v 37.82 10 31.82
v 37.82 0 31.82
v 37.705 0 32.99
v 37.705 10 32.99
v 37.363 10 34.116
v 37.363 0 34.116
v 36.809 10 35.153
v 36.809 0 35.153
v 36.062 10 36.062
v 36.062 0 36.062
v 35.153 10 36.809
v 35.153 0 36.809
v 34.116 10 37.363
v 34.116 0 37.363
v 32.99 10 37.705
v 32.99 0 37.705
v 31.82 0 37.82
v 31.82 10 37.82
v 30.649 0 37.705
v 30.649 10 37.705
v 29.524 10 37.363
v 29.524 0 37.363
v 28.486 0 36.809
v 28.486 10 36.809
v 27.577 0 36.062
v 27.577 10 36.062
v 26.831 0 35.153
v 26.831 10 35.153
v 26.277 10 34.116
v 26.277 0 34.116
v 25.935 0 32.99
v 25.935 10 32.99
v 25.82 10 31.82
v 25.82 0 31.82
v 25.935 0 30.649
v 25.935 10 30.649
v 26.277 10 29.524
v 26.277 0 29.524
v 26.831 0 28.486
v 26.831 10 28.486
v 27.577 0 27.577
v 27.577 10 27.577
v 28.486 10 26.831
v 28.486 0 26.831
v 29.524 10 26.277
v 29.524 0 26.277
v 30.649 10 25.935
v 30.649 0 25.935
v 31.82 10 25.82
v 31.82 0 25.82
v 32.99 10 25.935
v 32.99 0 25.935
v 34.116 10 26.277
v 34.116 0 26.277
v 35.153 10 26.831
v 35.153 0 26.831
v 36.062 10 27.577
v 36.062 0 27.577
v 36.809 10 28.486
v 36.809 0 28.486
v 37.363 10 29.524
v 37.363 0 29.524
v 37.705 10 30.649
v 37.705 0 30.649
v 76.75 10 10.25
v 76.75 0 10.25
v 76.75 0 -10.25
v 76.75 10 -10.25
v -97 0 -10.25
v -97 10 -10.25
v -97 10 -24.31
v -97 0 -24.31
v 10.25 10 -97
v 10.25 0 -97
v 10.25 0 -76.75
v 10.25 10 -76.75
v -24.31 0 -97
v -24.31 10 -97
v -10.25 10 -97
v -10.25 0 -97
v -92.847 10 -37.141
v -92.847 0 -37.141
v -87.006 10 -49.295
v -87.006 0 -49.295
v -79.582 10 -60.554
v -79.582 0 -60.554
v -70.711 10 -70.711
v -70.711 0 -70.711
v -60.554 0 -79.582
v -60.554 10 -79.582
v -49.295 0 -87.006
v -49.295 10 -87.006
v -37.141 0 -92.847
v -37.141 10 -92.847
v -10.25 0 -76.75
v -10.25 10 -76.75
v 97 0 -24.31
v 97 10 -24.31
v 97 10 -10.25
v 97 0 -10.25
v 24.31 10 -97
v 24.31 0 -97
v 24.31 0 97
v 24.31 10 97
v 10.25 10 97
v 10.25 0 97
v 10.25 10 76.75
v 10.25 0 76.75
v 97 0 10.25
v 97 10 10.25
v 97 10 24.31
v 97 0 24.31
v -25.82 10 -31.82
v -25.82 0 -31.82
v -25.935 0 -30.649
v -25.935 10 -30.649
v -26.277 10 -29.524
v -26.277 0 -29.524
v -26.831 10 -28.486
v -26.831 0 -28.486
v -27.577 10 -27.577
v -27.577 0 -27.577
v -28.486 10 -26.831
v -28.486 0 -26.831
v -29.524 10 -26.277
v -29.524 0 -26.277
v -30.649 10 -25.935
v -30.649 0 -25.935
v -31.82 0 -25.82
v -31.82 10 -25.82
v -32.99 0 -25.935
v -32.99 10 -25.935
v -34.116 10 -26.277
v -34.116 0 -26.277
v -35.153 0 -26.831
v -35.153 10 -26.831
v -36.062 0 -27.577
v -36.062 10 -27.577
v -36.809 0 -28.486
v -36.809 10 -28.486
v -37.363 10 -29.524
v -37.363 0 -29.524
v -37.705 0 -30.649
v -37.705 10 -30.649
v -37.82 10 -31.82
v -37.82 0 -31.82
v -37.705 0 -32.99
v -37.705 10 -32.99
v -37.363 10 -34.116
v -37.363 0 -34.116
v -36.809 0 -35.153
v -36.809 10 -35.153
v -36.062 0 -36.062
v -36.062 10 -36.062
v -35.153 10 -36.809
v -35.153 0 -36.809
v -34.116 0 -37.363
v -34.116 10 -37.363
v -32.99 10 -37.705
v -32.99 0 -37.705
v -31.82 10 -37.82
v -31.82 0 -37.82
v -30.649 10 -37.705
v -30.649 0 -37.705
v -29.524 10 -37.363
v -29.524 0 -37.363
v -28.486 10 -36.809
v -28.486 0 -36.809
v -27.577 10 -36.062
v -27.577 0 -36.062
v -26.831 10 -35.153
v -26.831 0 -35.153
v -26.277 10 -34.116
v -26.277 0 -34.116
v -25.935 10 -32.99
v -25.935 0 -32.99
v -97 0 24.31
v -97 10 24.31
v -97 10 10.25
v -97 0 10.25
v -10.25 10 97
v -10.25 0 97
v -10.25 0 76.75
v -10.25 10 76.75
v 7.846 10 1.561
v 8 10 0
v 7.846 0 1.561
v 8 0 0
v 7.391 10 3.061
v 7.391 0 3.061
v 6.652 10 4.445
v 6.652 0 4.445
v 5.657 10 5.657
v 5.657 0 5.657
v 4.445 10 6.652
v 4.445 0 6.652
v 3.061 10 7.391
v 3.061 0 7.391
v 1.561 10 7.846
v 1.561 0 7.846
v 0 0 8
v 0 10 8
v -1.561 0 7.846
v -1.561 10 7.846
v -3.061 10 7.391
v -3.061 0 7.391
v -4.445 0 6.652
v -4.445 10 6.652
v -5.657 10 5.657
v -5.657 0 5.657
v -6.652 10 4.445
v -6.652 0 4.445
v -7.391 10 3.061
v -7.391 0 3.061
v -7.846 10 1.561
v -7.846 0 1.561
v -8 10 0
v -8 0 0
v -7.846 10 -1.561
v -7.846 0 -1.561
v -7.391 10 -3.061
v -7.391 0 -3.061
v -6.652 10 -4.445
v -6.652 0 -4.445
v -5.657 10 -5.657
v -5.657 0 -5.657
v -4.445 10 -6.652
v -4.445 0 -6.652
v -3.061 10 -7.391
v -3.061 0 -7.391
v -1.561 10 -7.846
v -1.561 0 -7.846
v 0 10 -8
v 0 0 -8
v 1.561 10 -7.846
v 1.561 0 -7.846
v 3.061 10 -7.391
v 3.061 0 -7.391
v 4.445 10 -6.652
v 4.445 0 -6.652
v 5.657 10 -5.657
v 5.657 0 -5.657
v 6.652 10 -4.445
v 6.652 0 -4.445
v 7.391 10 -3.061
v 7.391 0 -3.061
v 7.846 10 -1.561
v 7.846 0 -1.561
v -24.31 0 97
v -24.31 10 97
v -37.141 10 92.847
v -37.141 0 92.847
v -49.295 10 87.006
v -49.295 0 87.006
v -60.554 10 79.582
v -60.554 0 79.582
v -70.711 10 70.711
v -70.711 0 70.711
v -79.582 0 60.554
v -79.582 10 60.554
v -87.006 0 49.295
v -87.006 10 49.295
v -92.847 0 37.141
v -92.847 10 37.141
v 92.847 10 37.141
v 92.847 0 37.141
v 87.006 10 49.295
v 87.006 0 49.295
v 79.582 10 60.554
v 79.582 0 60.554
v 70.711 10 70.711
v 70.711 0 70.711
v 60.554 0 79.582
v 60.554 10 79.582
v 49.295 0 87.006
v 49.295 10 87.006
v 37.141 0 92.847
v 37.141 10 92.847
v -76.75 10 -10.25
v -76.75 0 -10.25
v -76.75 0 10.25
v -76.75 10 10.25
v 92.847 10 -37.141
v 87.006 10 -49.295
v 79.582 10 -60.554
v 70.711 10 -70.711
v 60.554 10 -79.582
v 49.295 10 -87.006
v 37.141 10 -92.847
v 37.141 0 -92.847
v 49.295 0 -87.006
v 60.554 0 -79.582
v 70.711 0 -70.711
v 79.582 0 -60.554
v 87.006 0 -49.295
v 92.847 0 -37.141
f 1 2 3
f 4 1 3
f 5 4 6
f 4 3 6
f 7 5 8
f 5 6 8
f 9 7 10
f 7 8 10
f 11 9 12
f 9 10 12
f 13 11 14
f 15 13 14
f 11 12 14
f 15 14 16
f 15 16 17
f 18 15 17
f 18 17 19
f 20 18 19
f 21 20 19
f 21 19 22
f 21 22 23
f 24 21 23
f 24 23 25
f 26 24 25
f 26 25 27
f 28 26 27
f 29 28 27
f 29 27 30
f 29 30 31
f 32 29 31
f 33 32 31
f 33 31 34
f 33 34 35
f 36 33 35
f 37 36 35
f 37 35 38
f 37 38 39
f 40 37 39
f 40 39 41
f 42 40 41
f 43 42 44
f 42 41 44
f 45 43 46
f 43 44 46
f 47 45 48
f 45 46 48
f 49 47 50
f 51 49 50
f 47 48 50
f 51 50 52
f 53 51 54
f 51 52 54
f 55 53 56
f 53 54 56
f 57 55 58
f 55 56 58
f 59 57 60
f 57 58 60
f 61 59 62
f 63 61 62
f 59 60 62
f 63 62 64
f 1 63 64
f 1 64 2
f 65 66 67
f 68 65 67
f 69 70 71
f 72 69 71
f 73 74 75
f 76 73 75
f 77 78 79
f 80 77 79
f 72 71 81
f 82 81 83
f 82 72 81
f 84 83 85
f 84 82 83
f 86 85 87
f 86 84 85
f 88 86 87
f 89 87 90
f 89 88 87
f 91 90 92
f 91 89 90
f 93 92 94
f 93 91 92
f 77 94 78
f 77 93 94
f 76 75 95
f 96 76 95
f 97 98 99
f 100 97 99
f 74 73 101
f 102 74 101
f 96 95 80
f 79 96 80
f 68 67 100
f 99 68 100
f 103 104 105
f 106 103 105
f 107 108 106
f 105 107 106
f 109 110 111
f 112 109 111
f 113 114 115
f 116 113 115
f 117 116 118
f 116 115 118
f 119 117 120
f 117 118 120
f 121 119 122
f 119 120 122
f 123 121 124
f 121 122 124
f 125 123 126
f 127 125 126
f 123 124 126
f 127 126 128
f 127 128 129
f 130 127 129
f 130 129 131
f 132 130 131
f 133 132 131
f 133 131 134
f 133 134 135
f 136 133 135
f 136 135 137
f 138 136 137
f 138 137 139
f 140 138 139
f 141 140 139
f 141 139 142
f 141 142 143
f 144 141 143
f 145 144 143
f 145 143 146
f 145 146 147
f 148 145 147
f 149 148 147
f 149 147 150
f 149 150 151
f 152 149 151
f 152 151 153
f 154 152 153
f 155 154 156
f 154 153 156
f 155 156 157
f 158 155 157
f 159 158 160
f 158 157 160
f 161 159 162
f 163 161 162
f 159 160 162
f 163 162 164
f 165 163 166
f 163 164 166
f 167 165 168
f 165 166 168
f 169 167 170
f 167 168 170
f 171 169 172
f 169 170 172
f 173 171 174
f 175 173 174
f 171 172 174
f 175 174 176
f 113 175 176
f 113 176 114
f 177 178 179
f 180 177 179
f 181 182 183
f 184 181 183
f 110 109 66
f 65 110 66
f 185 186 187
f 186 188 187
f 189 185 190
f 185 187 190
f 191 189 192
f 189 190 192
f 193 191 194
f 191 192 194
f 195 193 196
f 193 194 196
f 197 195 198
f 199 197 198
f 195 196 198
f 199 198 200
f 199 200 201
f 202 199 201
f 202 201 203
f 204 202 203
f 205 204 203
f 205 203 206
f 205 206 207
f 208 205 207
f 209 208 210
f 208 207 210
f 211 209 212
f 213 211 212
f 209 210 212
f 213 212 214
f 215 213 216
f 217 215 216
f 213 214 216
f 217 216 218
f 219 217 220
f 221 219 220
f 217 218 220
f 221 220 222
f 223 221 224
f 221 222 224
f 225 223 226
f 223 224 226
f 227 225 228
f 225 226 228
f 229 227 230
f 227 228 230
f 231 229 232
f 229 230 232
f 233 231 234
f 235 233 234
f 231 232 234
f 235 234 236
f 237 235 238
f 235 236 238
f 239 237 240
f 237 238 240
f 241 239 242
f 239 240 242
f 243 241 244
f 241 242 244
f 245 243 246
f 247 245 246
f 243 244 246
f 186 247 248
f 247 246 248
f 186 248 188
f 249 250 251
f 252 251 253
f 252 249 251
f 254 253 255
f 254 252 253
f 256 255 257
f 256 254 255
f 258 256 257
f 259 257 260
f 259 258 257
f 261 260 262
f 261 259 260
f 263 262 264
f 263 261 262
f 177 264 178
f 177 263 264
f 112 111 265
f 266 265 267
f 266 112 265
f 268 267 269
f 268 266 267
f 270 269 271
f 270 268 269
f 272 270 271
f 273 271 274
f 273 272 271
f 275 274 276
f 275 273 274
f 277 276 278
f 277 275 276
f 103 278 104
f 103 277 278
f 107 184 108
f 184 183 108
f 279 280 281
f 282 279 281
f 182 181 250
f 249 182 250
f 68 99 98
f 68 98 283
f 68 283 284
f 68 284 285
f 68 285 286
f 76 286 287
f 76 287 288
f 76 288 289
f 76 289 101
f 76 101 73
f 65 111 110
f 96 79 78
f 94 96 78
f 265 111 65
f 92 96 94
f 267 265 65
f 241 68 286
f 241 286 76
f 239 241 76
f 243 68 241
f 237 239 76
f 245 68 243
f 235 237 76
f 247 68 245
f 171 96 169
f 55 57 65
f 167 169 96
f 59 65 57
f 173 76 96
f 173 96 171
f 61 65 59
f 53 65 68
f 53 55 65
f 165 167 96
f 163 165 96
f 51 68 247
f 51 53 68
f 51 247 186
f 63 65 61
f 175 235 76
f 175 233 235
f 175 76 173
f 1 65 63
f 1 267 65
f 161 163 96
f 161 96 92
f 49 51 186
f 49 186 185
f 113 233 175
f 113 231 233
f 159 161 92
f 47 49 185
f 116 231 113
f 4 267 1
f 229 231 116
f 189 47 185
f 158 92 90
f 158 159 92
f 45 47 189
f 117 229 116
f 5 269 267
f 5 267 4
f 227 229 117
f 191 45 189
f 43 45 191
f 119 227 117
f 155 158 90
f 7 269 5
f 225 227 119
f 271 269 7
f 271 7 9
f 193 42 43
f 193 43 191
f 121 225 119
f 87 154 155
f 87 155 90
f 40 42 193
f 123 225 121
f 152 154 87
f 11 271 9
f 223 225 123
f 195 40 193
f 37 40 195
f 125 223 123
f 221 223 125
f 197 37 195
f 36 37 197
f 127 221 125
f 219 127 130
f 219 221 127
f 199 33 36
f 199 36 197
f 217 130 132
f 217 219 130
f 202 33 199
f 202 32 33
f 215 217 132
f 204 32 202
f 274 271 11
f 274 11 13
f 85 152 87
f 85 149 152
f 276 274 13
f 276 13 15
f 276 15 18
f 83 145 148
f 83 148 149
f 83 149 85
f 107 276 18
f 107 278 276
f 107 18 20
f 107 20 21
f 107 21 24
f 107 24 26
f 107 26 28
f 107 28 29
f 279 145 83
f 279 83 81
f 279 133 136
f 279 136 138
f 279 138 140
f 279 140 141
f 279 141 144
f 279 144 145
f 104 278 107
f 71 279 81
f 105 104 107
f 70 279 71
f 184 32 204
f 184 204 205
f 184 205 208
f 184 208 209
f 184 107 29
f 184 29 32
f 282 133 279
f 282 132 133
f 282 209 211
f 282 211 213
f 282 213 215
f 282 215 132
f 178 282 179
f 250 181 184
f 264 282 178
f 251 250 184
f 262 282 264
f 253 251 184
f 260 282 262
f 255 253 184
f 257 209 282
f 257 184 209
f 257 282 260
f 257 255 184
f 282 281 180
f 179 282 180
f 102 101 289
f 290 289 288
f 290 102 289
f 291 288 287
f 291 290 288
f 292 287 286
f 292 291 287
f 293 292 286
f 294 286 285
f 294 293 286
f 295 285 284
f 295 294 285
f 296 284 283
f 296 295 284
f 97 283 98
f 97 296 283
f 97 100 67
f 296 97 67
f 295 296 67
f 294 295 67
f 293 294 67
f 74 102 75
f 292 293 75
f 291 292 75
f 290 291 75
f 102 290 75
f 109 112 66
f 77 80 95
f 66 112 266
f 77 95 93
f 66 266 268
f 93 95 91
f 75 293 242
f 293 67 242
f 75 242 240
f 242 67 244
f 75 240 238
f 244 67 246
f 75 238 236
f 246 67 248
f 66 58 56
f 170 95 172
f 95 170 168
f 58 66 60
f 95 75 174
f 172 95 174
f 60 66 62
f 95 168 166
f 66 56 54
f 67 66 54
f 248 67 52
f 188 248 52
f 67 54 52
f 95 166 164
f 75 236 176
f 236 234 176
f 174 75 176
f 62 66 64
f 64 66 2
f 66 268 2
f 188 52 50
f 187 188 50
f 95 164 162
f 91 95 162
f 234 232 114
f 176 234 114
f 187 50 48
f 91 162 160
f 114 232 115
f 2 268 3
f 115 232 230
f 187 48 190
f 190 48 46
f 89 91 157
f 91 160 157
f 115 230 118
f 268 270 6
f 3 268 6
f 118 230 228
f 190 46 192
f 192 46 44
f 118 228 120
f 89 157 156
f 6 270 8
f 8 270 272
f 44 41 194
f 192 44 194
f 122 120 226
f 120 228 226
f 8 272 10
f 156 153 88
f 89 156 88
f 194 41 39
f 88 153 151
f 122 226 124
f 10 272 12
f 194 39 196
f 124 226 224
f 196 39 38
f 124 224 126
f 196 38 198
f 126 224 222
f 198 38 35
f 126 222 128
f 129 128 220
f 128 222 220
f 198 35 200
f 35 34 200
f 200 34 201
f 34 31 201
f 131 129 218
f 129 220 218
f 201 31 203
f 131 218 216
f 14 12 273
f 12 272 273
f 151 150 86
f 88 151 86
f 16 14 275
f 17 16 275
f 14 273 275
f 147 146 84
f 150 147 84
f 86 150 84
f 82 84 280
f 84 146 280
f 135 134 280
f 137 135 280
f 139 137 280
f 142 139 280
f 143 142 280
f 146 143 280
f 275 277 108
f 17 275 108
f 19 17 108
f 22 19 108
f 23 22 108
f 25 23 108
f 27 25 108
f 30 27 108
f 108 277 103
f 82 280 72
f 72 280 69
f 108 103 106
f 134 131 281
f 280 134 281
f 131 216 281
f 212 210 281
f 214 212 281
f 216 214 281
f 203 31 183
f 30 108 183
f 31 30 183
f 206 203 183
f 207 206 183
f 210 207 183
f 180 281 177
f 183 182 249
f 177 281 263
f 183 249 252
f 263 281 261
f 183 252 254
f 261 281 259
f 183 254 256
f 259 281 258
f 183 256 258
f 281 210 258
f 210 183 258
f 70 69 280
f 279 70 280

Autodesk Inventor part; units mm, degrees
ref_plane "YZ Plane" through (0, 0, 0) normal (1, 0, 0) x (0, 1, 0)
ref_plane "XZ Plane" through (0, 0, 0) normal (0, 1, 0) x (-1, 0, 0)
ref_plane "XY Plane" through (0, 0, 0) normal (0, 0, 1) x (1, 0, 0)
sketch "Skizze1" plane through (0, 0, 0) normal (0, 1, 0) x (-1, 0, 0)
  circle A0 centre (0, 0) radius 100
  dimension "d0" = 200
extrude "Extrusion1" add sketch "Skizze1" along normal blind 10
sketch "Skizze2" plane through (0, 10, 0) normal (0, 1, 0) x (1, 0, 0)
  circle A0 centre (0, 0) radius 100 projected
  circle A1 centre (-87, 0) radius 3.1
  dimension "d3" = 6.2
  dimension "d4" = 87
  dimension "d5" = 200
extrude "Extrusion2" cut sketch "Skizze2" against normal through all contours A1
chamfer "Fasen1" distance 3 angle 45 1 edges at (-90.1, 0, 0)
sketch "Skizze3" plane through (0, 10, 0) normal (0, 1, 0) x (1, 0, 0)
  circle A0 centre (-87, 0) radius 3.1 projected
  circle A1 centre (0, 0) radius 100 projected
  line L0 (-97, -24.3105) -> (-97, 24.3105)
  circle A2 centre (0, 0) radius 100 projected
  point P0 (-97, -24.3105)
  dimension "d11" = 10
extrude "Extrusion3" cut sketch "Skizze3" against normal through all contours L0 A1 picked at (-97.7491, 4.0825)
pattern_circular "Runde Anordnung3" count 4 over 360 about axis through (0, -10, 0) along (0, 1, 0) of "Extrusion2", "Fasen1"
pattern_circular "Runde Anordnung4" count 4 over 360 about axis through (0, -10, 0) along (0, 1, 0) of "Extrusion3"
sketch "Skizze4" plane through (0, 0, 0) normal (0, -1, 0) x (1, 0, 0)
  circle A0 centre (0, 0) radius 8
  dimension "d26" = 16
extrude "Extrusion4" cut sketch "Skizze4" against normal through all
sketch "Skizze5" plane through (0, 0, 0) normal (0, -1, 0) x (1, 0, 0)
  circle A0 centre (0, 0) radius 8 projected
  circle A1 centre (0, -87) radius 6.1 projected
  circle A2 centre (0, 87) radius 6.1 projected
  line L0 (-24.3105, -97) -> (24.3105, -97) projected
  arc A3 (24.3105, -97) -> (97, -24.3105) centre (0, 0) ccw projected
  line L1 (97, -24.3105) -> (97, 24.3105) projected
  arc A4 (97, 24.3105) -> (24.3105, 97) centre (0, 0) ccw projected
  line L2 (24.3105, 97) -> (-24.3105, 97) projected
  arc A5 (-24.3105, 97) -> (-97, 24.3105) centre (0, 0) ccw projected
  line L3 (-97, 24.3105) -> (-97, -24.3105) projected
  arc A6 (-97, -24.3105) -> (-24.3105, -97) centre (0, 0) ccw projected
  circle A7 centre (-87, 0) radius 6.1 projected
  circle A8 centre (87, 0) radius 6.1 projected
  line L4 (-10.25, 76.75) -> (10.25, 76.75)
  line L5 (10.25, 76.75) -> (10.25, 97.25)
  line L6 (10.25, 97.25) -> (-10.25, 97.25)
  line L7 (-10.25, 97.25) -> (-10.25, 76.75)
  line L8 (-10.25, 76.75) -> (10.25, 97.25) construction
  line L9 (10.25, 76.75) -> (-10.25, 97.25) construction
  point P0 (10.25, 97)
  point P1 (-10.25, 97)
  dimension "d29" = 20.5
  dimension "d30" = 20.5
extrude "Extrusion5" cut sketch "Skizze5" against normal through all contours A2 | L2 L5 L4 L7
pattern_circular "Runde Anordnung5" count 4 over 360 about axis through (0, 0, 0) along (0, 1, 0) of "Extrusion5"
sketch "Skizze6" plane through (0, 0, 0) normal (0, -1, 0) x (1, 0, 0)
  line L0 (0, 0) -> (51.2757, 51.2757) construction
  circle A0 centre (0, 0) radius 8 projected
  line L1 (0, 0) -> (0, 40.1538) construction
  circle A1 centre (31.8198, 31.8198) radius 6
  line L2 (0, 0) -> (-46.8461, -46.8461) construction
  circle A2 centre (-31.8198, -31.8198) radius 6
  dimension "d36" = 45
  dimension "d37" = 12
  dimension "d38" = 45
  dimension "d39" = 12
  dimension "d40" = 45
extrude "Extrusion6" cut sketch "Skizze6" against normal through all contours A1 | A2
properties part number "plate_lower"
